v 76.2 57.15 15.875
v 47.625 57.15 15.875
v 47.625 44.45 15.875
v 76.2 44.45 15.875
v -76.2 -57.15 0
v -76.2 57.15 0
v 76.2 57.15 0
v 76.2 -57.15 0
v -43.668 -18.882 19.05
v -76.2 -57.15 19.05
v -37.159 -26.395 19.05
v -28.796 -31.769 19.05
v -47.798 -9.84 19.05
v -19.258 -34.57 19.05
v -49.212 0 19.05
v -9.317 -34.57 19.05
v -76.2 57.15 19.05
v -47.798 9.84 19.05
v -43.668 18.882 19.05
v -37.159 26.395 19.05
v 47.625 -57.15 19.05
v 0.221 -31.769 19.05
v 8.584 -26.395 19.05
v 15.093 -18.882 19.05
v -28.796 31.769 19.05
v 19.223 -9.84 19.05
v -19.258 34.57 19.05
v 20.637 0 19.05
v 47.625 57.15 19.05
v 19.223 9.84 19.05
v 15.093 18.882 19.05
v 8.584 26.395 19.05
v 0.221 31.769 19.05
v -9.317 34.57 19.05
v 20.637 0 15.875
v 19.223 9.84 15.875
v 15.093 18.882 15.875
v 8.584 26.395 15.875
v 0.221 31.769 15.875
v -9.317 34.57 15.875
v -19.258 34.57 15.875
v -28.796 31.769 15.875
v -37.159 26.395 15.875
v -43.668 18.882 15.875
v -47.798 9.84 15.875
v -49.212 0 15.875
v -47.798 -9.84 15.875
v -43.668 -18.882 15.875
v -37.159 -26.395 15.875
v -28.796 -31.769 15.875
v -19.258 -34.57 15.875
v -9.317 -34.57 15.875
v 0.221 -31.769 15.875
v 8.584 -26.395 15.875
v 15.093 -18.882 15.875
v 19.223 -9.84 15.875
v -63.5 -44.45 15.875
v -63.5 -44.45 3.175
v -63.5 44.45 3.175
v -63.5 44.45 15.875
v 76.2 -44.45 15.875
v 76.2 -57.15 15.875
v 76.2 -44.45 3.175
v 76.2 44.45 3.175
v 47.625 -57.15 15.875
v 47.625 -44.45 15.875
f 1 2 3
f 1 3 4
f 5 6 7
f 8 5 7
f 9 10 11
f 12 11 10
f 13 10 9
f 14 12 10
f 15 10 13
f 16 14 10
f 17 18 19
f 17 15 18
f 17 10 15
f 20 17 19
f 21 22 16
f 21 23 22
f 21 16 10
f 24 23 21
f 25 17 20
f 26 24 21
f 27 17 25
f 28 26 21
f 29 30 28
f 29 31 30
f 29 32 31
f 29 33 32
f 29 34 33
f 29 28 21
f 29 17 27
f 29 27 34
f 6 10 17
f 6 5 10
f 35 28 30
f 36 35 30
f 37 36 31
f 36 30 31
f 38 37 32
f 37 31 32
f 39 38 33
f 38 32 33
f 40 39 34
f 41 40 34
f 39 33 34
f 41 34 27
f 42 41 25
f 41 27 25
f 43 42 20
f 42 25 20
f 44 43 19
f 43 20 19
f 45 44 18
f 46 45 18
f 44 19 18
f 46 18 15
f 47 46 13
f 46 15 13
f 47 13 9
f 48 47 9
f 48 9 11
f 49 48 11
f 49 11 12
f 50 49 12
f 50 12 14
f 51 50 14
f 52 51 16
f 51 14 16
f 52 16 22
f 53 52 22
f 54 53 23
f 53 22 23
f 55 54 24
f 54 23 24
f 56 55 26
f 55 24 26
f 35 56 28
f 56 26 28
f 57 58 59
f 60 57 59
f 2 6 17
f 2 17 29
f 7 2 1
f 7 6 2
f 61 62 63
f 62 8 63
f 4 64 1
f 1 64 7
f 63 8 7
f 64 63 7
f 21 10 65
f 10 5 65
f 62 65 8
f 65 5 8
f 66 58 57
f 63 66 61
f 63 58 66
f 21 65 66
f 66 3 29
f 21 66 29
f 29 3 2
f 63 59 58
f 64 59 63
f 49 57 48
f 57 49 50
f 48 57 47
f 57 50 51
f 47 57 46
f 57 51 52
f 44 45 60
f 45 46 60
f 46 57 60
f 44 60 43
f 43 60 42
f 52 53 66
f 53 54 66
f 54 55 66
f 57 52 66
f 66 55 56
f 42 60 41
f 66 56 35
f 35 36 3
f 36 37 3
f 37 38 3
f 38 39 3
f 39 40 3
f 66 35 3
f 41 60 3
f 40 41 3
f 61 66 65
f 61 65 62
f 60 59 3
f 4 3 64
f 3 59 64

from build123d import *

# Parameters (mm, degrees)
F0_W     = 152.4
F0_H     = 114.3
F1_DEPTH = 3.175
F2_W     = 152.4
F2_H     = 12.7
F3_DEPTH = 12.7
F4_W     = 12.7
F4_H     = 88.9
F5_DEPTH = 12.7
F6_W     = 123.825
F6_H     = 114.3
F7_DEPTH = 3.175
F8_R     = 34.925
F9_DEPTH = 3.175


with BuildPart() as f1:
    # F0 (on Top) → F1 (new body)
    with BuildSketch(Plane.XY):
        Rectangle(F0_W, F0_H)
    extrude(amount=F1_DEPTH)

    # F2 (on face) → F3 (join)
    with BuildSketch(Plane.XY.offset(3.175)):
        with Locations((0, -50.8)):
            Rectangle(F2_W, F2_H)
        with Locations((0, 50.8)):
            Rectangle(F2_W, F2_H)
    extrude(amount=F3_DEPTH)

    # F4 (on face) → F5 (join)
    with BuildSketch(Plane.XY.offset(3.175)):
        with Locations((-69.85, 0)):
            Rectangle(F4_W, F4_H)
    extrude(amount=F5_DEPTH)

    # F6 (on face) → F7 (join)
    with BuildSketch(Plane.XY.offset(15.875)):
        with Locations((-14.2875, 0)):
            Rectangle(F6_W, F6_H)
    extrude(amount=F7_DEPTH)

    # F8 (on face) → F9 (cut)
    with BuildSketch(Plane.XY.offset(19.05)):
        with Locations((-14.2875, 0)):
            Circle(F8_R)
    extrude(amount=-F9_DEPTH, mode=Mode.SUBTRACT)


solid = f1.part
